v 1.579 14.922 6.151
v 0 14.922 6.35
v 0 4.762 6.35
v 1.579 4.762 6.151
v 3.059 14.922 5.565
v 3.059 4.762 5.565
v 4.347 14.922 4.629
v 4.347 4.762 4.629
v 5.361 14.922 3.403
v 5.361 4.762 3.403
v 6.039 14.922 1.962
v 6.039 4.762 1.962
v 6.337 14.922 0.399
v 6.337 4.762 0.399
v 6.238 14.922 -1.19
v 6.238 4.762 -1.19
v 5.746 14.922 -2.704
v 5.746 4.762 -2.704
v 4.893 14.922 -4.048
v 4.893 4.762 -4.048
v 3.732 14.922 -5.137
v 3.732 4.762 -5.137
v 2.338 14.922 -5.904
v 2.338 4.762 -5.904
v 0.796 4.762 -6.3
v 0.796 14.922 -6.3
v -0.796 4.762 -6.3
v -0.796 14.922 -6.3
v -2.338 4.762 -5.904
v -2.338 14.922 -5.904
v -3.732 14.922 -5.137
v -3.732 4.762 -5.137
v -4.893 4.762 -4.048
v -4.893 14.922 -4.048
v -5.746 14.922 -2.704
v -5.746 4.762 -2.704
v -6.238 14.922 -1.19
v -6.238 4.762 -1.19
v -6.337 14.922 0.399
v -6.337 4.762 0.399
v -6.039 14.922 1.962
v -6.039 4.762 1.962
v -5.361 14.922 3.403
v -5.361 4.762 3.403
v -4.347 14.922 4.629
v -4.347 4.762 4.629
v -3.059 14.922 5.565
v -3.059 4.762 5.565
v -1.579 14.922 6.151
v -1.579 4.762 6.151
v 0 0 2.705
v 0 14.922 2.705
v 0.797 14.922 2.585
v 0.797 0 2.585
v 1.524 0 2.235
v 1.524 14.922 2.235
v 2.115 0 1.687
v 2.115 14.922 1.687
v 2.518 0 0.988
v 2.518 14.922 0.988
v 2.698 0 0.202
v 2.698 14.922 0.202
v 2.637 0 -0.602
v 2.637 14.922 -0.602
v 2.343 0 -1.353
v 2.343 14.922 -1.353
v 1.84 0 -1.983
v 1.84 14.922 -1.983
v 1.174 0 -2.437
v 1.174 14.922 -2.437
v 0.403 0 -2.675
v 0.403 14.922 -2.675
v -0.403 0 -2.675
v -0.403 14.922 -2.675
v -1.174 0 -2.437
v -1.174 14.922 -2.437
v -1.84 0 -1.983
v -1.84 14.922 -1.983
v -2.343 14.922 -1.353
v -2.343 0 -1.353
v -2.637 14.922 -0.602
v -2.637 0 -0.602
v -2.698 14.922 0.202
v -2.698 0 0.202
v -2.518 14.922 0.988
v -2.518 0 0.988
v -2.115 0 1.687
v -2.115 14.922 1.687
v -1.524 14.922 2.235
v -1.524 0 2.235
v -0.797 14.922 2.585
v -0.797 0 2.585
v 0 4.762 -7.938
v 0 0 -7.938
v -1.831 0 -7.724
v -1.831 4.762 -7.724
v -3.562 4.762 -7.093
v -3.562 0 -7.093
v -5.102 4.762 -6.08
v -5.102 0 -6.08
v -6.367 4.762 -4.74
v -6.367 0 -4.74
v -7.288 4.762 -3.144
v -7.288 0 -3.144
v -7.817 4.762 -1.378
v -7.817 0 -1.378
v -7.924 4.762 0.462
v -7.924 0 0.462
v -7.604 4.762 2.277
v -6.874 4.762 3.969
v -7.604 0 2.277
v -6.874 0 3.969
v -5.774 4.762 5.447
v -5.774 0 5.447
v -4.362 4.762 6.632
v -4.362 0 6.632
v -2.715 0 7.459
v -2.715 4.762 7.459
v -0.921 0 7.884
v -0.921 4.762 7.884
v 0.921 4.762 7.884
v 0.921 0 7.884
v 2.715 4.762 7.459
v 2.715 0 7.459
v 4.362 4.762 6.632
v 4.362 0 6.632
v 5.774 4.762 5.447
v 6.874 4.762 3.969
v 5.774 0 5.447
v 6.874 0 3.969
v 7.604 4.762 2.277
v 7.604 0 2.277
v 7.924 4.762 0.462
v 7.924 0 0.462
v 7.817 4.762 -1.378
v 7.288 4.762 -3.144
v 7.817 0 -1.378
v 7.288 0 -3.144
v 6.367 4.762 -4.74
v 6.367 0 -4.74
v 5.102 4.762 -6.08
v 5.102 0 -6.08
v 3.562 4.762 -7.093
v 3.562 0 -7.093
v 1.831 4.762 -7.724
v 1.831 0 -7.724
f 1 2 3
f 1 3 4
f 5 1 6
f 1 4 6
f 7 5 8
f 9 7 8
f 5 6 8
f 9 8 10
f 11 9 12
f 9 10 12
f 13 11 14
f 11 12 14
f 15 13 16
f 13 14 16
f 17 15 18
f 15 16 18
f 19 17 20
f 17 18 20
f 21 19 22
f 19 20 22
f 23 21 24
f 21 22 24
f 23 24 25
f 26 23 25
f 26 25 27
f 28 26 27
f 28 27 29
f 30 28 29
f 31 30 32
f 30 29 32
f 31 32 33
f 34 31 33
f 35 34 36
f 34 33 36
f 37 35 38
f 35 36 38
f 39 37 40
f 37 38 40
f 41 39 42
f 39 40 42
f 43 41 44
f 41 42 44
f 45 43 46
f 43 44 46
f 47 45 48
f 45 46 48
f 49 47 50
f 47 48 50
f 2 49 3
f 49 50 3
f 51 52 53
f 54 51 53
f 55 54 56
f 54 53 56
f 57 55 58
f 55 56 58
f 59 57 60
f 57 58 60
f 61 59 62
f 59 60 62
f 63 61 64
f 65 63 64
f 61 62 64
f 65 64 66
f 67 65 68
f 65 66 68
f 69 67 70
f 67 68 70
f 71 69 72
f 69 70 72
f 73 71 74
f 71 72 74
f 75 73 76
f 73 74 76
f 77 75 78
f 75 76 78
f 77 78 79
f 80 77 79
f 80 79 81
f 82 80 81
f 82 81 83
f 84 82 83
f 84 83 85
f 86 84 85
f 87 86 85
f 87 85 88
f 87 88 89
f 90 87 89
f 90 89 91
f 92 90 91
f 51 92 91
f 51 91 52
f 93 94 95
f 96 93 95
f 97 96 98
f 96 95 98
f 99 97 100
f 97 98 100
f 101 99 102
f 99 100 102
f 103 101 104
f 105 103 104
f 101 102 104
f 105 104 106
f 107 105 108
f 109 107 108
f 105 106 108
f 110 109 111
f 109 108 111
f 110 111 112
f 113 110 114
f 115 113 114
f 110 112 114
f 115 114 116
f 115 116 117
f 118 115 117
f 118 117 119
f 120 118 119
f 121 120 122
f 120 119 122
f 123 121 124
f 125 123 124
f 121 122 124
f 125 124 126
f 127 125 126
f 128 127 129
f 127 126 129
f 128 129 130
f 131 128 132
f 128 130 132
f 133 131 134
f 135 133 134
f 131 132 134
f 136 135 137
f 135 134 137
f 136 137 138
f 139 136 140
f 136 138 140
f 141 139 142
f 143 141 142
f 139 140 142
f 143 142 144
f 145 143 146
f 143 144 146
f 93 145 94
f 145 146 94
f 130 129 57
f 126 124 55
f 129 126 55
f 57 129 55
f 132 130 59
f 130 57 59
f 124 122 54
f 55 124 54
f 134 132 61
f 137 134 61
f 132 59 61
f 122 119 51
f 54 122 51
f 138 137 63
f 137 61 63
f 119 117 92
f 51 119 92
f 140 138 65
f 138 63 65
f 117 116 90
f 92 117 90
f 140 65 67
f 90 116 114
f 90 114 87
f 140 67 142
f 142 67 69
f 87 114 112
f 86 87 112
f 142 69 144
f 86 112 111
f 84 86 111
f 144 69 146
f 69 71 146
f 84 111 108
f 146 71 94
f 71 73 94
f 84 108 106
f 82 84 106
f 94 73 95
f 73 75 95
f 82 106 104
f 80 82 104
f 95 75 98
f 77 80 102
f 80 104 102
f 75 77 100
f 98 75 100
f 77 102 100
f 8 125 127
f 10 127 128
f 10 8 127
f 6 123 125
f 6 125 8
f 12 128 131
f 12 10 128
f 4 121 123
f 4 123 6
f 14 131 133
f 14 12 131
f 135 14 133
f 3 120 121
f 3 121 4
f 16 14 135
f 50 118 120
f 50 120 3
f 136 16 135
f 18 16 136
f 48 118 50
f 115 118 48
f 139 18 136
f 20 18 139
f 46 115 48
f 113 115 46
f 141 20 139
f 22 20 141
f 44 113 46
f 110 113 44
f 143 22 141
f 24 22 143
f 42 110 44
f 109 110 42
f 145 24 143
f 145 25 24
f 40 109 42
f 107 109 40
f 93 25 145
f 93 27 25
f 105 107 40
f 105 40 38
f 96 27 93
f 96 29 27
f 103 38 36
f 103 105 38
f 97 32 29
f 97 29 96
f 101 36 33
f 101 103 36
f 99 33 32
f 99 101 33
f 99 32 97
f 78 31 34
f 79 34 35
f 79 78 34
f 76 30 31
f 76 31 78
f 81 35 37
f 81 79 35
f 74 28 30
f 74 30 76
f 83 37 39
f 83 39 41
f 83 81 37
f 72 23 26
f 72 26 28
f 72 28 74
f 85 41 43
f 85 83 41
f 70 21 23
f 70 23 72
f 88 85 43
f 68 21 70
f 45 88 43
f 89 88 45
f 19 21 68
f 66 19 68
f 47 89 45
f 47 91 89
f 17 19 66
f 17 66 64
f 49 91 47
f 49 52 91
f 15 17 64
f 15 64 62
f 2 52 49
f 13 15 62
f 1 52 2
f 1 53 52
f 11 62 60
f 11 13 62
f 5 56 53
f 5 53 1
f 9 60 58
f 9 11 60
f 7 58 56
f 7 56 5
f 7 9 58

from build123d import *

# Parameters (mm, degrees)
SKETCH1_R           = 7.9375
BOSS_EXTRUDE1_DEPTH = 4.7625
SKETCH2_R           = 6.35
BOSS_EXTRUDE2_DEPTH = 10.16
SKETCH3_R           = 2.7051
CUT_EXTRUDE1_DEPTH  = 19.67321126


with BuildPart() as part:
    # Sketch1 → Boss-Extrude1 (new body)
    with BuildSketch(Plane(origin=(0, 0, 0), x_dir=(1, 0, 0), z_dir=(0, 1, 0))):
        with Locations(Location((0, 0, 0), (0, 0, 90))):
            Circle(SKETCH1_R)
    extrude(amount=BOSS_EXTRUDE1_DEPTH)

    # Sketch2 → Boss-Extrude2 (add)
    with BuildSketch(Plane(origin=(0, 4.7625, 0), x_dir=(1, 0, 0), z_dir=(0, 1, 0))):
        with Locations(Location((0, 0, 0), (0, 0, 270))):
            Circle(SKETCH2_R)
    extrude(amount=BOSS_EXTRUDE2_DEPTH)

    # Sketch3 → Cut-Extrude1 (cut, through all)
    with BuildSketch(Plane(origin=(0, 14.9225, 0), x_dir=(1, 0, 0), z_dir=(0, 1, 0))):
        with Locations(Location((0, 0, 0), (0, 0, 270))):
            Circle(SKETCH3_R)
    extrude(amount=-CUT_EXTRUDE1_DEPTH, mode=Mode.SUBTRACT)


solid = part.part
